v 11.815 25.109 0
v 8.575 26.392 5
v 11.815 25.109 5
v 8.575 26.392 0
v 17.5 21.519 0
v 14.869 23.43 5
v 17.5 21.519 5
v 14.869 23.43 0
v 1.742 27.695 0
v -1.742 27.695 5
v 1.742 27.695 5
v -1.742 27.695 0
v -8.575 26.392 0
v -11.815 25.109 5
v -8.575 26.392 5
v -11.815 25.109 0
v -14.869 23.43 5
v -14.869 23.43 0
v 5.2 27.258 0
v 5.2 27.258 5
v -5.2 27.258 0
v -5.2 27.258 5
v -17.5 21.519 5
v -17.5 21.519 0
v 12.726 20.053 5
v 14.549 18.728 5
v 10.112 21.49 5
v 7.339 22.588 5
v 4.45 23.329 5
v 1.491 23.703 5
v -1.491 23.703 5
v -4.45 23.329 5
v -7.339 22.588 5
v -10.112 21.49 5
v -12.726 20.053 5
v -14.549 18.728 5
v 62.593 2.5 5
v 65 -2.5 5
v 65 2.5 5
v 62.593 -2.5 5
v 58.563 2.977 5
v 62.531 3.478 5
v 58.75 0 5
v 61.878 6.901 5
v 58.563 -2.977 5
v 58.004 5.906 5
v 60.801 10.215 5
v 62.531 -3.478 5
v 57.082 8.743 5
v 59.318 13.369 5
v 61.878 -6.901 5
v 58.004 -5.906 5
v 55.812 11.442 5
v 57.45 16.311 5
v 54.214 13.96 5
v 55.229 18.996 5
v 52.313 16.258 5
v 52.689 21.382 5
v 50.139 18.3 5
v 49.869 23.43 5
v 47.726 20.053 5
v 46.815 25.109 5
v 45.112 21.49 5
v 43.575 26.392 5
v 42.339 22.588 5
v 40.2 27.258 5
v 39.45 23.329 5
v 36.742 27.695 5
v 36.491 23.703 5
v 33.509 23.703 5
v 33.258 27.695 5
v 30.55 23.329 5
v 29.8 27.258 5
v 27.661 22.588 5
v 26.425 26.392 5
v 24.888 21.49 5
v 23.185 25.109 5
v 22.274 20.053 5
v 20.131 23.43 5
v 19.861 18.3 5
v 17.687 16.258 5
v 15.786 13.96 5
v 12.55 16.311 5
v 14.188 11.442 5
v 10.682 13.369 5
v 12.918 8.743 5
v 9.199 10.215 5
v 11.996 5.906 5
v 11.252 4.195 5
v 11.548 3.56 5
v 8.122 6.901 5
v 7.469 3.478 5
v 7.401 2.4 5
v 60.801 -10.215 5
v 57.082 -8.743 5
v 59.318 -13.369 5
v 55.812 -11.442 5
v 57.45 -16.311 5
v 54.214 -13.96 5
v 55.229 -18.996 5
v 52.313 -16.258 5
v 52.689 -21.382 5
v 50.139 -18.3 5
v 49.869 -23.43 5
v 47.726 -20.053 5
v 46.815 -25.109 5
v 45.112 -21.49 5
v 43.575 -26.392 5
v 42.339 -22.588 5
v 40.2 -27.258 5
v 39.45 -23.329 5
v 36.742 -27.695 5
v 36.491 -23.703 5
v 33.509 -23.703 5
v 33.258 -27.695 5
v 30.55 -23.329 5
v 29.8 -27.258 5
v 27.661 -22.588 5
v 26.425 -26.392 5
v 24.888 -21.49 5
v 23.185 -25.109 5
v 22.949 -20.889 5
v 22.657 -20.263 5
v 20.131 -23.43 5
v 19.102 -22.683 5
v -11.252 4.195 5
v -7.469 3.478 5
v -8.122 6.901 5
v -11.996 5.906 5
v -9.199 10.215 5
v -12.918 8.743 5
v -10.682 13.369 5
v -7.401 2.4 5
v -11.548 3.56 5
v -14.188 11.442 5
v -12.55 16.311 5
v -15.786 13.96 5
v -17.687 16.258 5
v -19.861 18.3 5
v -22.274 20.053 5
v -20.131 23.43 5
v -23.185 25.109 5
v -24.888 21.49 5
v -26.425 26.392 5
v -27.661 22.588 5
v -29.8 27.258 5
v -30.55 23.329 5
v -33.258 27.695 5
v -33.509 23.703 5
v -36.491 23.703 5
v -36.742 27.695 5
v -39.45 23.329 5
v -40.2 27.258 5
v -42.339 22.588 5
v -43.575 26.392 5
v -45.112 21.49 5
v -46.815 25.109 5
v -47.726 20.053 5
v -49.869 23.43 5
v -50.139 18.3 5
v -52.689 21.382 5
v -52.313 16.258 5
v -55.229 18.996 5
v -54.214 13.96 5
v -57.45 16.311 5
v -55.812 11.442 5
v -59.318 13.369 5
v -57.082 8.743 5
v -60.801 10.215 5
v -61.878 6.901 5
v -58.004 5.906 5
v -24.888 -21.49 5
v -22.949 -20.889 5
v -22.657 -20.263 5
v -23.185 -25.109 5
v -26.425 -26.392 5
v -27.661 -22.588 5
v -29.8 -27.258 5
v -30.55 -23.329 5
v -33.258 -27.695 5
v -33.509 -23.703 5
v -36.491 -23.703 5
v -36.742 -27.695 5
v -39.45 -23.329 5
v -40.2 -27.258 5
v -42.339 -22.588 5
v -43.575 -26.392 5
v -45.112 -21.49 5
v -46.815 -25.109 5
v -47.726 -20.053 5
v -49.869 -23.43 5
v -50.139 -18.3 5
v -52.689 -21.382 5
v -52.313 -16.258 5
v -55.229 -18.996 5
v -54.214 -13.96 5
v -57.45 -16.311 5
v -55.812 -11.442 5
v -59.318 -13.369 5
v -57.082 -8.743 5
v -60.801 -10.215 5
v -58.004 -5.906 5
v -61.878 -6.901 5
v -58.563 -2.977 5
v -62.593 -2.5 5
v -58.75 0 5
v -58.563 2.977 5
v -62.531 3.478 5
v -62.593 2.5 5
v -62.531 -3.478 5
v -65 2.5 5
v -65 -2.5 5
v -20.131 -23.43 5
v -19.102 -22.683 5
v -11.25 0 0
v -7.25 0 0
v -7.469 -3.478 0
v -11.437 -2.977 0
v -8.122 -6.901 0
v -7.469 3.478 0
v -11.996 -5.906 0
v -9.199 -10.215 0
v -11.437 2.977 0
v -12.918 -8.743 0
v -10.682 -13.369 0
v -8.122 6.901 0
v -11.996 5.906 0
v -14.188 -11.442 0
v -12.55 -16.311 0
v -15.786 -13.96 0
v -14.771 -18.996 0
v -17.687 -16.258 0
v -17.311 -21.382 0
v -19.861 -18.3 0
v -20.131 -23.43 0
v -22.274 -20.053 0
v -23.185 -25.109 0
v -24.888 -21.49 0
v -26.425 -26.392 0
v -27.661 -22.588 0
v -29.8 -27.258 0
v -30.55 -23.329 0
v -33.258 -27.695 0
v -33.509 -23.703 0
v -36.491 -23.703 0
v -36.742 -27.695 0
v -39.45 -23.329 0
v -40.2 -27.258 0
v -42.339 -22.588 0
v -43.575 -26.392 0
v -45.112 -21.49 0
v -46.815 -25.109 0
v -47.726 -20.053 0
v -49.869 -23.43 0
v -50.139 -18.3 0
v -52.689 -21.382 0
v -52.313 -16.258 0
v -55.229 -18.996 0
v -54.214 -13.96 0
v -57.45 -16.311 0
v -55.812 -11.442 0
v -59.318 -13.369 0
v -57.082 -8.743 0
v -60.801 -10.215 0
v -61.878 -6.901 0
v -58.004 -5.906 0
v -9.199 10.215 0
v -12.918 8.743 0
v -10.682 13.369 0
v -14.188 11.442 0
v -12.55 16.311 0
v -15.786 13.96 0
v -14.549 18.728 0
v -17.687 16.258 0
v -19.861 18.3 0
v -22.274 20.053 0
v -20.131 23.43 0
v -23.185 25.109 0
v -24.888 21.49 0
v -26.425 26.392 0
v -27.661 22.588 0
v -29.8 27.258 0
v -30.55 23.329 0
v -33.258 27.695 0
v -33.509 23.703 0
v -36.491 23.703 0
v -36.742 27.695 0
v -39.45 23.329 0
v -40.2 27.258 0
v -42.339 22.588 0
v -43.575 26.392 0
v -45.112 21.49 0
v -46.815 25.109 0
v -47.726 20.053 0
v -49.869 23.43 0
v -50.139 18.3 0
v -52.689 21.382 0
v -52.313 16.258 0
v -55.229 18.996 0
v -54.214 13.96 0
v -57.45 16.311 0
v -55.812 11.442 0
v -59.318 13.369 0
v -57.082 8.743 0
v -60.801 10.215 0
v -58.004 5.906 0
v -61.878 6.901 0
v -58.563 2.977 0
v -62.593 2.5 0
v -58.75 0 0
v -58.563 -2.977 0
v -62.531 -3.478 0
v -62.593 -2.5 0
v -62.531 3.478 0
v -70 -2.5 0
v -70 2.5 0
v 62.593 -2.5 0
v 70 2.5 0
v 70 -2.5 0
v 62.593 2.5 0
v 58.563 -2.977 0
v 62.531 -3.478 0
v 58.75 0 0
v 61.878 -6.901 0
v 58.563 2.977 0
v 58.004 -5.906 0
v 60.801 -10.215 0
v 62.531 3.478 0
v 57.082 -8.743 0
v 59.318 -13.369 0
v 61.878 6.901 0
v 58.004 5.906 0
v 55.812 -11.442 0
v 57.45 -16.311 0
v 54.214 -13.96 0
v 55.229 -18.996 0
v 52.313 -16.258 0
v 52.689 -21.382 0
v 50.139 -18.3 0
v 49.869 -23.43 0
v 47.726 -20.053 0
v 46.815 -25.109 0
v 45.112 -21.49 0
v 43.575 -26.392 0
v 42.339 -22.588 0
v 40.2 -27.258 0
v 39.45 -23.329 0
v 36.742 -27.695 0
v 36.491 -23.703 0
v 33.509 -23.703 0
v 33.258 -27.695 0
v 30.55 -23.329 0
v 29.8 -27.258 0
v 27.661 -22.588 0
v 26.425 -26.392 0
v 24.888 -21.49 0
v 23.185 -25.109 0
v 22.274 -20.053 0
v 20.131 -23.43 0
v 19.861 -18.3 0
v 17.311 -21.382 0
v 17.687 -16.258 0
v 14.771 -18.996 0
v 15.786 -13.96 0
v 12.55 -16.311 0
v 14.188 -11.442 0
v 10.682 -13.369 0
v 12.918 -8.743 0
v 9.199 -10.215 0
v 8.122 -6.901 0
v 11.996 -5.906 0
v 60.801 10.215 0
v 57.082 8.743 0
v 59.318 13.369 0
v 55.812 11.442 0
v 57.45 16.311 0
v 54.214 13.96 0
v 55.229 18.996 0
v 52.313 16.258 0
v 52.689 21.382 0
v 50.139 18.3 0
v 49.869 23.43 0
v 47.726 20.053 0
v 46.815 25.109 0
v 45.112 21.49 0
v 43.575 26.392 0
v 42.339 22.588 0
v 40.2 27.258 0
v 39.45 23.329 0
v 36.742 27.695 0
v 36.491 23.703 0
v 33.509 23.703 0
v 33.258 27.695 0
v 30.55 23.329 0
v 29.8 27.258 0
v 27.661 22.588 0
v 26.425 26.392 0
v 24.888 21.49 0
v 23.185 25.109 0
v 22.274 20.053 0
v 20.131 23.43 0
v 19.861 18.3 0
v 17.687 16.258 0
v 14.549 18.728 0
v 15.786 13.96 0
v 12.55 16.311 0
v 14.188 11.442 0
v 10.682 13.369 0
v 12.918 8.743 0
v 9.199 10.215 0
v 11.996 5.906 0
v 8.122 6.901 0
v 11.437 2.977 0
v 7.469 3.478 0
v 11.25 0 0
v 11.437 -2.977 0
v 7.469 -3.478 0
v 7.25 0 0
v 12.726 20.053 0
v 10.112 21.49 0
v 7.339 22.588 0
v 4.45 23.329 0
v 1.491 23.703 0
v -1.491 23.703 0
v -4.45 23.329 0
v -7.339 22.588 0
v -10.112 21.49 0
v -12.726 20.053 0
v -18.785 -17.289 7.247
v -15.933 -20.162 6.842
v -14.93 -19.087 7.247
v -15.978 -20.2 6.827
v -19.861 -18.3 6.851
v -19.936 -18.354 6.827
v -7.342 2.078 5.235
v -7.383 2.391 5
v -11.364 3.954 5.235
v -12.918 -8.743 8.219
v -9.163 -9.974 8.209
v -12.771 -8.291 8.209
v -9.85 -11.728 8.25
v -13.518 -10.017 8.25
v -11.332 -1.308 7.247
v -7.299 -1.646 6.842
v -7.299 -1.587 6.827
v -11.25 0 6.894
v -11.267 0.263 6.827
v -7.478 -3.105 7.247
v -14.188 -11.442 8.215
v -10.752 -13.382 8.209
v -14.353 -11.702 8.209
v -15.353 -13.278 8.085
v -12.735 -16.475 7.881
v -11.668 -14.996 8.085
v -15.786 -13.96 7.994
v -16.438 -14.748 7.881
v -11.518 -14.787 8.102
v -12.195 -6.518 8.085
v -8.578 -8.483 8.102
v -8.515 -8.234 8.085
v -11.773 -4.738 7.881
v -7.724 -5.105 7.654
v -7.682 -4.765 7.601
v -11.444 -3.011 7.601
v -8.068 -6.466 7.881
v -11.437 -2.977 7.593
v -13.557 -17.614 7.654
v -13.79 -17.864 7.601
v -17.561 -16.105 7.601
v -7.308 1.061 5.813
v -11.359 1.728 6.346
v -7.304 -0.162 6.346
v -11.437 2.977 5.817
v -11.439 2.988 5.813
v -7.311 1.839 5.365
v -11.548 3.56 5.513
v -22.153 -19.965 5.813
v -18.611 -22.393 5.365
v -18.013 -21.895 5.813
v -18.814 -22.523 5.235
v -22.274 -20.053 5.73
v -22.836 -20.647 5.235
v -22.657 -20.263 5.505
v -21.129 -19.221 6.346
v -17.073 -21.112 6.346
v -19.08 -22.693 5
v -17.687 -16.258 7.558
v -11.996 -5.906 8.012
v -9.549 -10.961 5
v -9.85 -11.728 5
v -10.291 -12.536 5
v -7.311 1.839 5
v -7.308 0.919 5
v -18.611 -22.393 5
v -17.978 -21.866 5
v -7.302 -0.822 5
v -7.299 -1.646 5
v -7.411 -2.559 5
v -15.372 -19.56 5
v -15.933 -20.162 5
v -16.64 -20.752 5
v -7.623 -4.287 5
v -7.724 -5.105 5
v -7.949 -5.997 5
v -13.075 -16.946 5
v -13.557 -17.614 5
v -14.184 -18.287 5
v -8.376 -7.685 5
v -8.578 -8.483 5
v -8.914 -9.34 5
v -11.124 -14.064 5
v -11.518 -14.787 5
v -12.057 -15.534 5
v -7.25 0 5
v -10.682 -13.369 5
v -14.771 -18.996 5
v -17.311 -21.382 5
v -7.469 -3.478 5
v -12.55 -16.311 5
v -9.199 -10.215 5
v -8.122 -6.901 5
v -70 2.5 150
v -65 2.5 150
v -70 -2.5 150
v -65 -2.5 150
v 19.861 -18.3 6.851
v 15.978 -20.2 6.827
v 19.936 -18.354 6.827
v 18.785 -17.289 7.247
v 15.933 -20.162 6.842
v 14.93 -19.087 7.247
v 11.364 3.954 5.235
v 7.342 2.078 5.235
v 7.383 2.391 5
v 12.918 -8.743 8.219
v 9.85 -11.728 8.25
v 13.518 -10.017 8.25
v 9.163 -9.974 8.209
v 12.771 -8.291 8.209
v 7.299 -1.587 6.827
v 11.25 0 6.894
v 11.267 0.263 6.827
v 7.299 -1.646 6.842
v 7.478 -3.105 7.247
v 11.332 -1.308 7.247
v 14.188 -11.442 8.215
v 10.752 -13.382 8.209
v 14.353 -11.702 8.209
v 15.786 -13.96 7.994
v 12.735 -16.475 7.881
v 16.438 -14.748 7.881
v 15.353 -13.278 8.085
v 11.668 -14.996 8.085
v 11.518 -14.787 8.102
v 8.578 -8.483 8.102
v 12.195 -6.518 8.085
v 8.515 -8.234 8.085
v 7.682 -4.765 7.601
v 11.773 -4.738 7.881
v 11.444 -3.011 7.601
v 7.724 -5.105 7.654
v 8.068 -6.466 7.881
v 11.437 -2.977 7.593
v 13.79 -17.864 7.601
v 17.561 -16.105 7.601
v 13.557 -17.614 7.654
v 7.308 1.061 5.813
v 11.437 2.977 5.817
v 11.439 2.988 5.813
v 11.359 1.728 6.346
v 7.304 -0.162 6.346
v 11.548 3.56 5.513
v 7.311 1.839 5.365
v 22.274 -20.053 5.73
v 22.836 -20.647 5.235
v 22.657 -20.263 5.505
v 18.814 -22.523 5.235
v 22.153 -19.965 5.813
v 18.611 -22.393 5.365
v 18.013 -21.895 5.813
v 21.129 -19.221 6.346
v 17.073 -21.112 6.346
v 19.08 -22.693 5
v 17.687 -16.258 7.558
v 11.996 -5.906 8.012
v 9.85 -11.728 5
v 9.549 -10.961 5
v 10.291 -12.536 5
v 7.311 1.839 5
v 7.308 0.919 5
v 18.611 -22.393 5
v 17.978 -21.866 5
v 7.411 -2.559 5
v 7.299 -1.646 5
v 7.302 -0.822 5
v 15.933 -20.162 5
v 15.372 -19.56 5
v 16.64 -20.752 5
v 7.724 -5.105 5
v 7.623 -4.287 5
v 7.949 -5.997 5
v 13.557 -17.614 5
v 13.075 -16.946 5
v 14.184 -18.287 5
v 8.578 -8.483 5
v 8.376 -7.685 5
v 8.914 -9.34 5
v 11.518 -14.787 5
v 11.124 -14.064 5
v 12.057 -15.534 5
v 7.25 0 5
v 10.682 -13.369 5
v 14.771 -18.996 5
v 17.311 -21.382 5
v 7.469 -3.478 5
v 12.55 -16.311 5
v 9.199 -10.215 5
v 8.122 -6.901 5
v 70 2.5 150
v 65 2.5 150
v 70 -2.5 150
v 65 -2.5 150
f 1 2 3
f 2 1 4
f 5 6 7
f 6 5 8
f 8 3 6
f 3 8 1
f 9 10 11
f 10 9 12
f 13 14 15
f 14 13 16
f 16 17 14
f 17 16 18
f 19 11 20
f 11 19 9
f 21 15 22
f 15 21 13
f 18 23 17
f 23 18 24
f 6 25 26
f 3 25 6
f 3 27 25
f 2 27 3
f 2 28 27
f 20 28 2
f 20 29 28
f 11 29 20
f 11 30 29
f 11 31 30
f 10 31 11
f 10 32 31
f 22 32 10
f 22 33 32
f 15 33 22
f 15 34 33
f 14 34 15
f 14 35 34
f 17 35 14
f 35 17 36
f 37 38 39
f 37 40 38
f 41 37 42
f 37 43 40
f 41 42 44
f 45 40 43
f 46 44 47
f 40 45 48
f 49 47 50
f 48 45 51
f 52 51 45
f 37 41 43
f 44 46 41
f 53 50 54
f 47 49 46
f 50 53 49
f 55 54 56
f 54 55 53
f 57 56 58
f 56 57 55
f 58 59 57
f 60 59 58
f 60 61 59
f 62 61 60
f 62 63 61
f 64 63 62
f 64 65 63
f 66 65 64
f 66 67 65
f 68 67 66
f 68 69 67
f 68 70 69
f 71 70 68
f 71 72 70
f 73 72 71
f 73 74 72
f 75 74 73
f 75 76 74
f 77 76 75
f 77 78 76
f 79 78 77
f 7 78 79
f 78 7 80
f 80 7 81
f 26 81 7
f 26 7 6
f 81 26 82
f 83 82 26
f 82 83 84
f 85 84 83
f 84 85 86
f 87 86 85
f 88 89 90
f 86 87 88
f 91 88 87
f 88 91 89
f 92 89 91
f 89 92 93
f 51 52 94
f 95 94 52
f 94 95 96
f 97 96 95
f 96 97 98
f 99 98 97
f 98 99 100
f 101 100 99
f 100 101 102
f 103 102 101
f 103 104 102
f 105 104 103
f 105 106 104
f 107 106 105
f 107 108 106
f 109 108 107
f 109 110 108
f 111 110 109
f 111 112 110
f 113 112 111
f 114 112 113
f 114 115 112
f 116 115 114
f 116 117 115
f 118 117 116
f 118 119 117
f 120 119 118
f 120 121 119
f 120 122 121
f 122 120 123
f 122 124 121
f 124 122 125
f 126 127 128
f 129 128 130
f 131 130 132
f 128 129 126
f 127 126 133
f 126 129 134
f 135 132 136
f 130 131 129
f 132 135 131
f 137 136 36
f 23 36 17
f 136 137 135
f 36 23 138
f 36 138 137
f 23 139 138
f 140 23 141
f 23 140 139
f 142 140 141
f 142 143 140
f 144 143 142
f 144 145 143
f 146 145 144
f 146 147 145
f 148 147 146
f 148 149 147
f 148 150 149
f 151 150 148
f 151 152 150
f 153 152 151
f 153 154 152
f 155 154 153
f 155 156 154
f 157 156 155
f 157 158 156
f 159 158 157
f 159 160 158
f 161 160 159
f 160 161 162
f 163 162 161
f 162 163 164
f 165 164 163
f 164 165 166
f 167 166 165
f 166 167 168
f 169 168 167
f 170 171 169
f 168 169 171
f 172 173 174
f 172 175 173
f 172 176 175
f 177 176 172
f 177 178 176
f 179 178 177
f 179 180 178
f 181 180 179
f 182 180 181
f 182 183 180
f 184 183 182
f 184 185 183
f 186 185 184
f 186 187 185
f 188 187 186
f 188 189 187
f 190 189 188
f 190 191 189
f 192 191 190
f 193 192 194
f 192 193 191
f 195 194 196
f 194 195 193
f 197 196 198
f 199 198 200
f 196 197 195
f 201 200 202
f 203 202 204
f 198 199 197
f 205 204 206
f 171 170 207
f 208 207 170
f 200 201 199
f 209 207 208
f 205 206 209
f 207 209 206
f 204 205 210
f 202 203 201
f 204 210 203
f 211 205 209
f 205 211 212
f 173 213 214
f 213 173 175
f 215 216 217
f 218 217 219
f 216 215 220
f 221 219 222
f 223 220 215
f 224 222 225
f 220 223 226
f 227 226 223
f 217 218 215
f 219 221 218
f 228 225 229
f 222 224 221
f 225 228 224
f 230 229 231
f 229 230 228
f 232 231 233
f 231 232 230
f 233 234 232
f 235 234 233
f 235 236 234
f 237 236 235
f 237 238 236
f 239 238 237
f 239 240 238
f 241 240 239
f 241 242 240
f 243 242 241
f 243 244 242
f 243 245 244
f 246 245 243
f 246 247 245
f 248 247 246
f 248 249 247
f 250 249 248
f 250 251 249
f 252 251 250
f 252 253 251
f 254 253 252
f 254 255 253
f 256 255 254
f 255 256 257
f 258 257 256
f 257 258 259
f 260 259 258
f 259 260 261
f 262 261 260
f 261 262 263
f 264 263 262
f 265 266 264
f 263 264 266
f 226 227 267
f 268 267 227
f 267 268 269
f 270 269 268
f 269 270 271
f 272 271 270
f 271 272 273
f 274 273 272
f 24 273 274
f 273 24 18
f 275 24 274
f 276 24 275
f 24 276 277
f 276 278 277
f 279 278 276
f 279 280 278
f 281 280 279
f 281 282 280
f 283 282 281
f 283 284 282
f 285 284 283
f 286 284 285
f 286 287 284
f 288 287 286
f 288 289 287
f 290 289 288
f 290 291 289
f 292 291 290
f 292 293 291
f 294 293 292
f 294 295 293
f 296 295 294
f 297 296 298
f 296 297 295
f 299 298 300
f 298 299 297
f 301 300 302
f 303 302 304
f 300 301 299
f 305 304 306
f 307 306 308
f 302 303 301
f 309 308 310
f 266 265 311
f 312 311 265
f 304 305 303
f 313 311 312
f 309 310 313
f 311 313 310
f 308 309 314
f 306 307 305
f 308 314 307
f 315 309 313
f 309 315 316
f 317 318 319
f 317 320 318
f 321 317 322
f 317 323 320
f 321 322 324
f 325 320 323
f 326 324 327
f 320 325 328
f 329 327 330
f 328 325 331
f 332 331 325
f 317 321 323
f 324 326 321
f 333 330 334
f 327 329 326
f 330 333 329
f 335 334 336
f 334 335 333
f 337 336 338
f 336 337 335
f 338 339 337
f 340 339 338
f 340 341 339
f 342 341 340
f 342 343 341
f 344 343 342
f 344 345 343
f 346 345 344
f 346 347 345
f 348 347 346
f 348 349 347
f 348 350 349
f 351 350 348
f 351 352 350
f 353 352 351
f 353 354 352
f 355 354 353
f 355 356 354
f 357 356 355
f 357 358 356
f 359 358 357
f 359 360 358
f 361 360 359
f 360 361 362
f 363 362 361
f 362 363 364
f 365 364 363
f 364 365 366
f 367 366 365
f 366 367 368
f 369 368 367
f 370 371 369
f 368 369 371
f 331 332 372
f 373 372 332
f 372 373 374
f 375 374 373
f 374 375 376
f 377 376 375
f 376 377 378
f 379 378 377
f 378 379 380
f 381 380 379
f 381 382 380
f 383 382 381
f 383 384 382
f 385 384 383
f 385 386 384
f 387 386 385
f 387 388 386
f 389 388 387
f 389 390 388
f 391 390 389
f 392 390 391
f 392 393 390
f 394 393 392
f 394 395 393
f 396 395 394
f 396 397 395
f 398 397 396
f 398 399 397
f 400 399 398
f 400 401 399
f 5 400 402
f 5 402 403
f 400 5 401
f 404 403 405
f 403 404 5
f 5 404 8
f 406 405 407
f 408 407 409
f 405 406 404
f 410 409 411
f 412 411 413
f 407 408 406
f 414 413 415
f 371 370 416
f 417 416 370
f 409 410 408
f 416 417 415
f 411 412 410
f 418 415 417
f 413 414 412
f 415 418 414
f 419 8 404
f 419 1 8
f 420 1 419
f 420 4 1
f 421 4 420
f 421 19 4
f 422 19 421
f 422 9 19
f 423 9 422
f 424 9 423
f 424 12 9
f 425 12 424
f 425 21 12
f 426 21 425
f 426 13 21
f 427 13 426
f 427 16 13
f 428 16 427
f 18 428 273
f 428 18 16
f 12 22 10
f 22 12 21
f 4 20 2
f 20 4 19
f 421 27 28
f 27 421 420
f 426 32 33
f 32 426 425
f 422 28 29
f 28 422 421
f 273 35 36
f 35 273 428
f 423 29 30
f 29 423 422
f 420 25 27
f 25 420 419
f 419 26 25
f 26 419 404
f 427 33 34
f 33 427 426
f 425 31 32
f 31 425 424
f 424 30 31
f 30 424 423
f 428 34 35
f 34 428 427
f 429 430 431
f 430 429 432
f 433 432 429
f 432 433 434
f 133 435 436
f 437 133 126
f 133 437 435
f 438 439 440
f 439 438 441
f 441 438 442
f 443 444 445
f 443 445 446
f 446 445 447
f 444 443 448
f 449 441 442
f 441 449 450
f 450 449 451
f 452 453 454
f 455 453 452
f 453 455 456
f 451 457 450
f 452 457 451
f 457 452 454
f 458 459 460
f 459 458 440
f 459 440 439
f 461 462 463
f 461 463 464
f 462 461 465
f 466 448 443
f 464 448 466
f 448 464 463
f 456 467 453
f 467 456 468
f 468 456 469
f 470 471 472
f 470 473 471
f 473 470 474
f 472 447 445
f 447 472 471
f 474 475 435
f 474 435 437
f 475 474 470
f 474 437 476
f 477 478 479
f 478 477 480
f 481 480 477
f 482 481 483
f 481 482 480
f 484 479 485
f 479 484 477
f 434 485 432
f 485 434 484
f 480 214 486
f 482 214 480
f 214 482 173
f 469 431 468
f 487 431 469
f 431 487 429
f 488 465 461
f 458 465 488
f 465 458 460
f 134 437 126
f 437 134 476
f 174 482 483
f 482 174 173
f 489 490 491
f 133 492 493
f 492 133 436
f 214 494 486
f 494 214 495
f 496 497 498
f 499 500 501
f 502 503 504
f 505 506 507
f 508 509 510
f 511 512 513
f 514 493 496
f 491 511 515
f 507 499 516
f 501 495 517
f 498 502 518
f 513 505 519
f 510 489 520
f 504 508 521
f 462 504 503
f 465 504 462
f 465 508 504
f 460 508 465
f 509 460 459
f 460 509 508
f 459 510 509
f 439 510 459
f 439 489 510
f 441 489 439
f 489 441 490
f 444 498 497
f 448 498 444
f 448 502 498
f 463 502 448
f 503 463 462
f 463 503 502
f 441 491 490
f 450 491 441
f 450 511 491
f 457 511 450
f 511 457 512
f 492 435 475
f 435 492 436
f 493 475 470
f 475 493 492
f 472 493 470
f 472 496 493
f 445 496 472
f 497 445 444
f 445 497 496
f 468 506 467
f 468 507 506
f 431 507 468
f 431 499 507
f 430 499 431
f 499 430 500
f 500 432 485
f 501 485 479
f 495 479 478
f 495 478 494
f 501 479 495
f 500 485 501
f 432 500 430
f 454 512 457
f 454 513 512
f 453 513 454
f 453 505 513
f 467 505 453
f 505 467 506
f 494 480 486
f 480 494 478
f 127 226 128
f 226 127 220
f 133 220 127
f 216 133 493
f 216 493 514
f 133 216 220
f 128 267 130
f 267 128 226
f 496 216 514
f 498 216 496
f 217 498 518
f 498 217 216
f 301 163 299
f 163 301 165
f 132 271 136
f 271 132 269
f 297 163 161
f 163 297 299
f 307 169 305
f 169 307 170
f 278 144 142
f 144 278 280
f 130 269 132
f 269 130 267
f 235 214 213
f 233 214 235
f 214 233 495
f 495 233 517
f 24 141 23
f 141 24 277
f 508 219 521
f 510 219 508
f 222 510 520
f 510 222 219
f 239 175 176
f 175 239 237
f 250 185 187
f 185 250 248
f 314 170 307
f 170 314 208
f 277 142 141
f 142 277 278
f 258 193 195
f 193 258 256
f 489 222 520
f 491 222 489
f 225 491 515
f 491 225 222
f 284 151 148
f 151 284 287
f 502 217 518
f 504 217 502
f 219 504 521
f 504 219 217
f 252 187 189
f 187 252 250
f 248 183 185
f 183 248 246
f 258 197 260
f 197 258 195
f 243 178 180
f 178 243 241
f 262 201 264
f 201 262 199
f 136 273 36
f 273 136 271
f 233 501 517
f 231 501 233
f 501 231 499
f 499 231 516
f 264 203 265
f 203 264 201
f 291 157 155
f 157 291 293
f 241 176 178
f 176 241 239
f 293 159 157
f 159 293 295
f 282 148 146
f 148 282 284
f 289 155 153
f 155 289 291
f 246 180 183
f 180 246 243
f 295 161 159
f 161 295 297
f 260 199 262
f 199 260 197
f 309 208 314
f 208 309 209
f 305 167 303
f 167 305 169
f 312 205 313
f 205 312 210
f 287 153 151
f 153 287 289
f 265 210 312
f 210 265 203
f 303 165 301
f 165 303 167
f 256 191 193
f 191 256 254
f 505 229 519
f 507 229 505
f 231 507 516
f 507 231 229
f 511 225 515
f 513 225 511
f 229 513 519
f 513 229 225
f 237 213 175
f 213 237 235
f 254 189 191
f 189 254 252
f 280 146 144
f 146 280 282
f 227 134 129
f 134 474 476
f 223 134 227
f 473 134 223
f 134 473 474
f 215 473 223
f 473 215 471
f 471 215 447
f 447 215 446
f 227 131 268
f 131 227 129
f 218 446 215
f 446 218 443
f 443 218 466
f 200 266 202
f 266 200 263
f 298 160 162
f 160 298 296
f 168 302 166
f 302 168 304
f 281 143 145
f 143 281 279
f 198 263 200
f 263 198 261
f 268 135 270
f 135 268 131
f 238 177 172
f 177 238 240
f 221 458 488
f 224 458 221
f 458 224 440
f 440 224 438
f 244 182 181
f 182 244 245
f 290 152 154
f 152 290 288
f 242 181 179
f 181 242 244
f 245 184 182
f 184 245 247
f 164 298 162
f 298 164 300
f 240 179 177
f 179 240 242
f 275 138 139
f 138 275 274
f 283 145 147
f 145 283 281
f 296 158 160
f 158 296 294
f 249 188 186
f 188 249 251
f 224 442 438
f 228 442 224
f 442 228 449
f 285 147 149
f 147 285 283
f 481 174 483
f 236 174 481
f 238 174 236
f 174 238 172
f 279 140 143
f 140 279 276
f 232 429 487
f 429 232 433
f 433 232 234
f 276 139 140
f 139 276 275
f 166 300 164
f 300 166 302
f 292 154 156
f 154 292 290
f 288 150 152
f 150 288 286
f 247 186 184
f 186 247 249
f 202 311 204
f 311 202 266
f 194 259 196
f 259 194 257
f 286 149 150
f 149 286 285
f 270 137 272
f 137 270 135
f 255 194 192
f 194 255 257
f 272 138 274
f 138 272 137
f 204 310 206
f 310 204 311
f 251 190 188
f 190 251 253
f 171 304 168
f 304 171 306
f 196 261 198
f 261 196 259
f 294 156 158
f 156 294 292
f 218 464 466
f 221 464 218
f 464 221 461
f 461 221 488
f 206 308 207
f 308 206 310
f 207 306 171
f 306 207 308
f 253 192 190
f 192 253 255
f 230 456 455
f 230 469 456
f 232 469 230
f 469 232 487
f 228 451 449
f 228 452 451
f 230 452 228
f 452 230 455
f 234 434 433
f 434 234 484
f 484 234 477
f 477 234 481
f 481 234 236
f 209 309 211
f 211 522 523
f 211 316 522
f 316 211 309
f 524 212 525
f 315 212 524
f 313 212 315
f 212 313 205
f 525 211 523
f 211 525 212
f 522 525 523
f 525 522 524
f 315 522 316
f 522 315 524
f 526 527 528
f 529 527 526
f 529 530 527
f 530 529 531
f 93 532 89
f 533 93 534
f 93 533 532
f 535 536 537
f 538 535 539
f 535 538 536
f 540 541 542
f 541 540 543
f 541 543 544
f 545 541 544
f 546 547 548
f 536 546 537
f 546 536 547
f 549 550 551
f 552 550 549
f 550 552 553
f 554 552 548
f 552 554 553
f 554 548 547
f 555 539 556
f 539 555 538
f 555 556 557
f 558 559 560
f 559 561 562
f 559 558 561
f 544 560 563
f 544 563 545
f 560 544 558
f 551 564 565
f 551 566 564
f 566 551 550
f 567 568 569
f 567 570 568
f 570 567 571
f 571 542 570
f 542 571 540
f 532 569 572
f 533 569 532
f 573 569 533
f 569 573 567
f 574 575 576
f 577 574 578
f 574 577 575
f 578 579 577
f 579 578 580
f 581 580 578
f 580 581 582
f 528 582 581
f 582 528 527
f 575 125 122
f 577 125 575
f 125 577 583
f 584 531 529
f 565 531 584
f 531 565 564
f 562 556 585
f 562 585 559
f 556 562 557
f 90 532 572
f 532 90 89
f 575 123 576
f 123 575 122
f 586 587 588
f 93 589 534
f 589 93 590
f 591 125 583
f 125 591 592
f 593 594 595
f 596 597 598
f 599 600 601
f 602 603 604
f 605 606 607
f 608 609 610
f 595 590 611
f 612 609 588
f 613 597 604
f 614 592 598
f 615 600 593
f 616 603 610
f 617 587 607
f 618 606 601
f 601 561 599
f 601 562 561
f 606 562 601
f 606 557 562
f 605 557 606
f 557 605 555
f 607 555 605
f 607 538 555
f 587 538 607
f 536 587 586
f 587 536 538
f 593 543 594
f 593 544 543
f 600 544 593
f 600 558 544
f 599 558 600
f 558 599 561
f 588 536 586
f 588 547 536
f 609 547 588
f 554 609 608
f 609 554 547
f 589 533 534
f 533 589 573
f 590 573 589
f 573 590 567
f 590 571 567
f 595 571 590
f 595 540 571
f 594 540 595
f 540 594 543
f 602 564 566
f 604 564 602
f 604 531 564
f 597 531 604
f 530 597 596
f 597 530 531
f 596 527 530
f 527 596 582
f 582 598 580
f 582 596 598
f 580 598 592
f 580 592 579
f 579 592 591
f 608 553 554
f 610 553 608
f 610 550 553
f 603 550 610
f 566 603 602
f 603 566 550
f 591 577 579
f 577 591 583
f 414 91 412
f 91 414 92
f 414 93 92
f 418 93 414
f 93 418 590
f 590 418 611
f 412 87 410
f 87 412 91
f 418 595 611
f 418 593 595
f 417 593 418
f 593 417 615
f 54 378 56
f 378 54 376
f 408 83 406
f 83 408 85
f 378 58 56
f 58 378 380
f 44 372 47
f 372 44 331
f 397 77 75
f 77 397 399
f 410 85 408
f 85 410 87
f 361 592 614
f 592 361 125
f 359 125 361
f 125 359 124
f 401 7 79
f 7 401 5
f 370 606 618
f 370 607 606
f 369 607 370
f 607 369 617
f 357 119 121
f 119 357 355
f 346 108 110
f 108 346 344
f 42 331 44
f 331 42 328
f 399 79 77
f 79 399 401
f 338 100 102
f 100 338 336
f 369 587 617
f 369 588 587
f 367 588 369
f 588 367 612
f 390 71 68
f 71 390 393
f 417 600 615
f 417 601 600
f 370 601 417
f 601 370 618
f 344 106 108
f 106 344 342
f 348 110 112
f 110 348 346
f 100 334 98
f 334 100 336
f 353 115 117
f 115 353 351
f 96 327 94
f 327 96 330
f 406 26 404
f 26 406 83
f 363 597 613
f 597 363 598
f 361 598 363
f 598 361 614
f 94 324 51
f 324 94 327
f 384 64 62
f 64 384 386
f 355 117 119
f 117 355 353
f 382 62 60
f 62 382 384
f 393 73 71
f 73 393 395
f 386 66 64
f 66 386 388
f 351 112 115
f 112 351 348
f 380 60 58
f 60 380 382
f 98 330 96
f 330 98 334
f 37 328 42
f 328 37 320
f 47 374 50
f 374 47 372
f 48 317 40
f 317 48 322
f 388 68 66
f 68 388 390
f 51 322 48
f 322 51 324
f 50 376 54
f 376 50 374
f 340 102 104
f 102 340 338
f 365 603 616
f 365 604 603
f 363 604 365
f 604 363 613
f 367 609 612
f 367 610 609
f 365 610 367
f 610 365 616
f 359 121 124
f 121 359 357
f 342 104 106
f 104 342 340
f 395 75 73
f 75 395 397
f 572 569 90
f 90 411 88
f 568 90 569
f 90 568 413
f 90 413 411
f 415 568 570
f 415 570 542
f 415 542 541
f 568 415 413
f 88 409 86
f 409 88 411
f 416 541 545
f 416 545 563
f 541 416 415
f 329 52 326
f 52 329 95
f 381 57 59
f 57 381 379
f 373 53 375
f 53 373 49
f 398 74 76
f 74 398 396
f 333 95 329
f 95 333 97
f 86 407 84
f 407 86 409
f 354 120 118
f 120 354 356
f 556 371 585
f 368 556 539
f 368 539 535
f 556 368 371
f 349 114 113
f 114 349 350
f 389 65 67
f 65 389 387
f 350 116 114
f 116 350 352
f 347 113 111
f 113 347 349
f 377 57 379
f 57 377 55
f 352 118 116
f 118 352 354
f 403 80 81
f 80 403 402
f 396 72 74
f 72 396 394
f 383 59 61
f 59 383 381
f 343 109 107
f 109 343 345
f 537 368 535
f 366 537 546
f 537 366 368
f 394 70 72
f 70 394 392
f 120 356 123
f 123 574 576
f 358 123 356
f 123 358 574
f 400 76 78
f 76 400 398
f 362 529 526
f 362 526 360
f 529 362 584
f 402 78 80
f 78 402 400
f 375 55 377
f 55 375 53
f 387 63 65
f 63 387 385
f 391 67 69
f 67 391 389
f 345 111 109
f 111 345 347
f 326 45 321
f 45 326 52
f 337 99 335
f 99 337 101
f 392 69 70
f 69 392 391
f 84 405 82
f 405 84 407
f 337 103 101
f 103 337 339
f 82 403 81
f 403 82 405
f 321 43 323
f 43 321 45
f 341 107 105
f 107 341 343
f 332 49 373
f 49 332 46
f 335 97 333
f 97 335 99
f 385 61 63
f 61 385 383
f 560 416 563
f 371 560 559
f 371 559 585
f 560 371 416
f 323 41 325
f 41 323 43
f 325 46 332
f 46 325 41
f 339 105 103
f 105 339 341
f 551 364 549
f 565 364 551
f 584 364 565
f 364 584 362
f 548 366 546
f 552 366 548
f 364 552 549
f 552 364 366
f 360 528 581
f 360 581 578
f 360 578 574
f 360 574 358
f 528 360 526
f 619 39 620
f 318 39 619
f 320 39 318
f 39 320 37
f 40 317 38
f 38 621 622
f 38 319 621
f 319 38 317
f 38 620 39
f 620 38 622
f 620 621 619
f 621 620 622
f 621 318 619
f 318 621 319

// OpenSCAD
//Lens diameter
gdiam=47.5;
//Temple size (width of glasses).
tsize=135;
//Pupil distance
pd=70;
//Glasses thickness
th=4;
//Temple length
lscales=150;
//Thickness of the lenses
gheight=5;

$fn=50;

module EyeCylinder()
{
        difference()
        {
            union()
            {
                cylinder(d=gdiam+th*2, h=gheight);
                NosePad();
            }
            LensHole();
        }  
}

module  LensHole()
{
    translate([0,0,-.1])
    cylinder(d=gdiam, h=gheight*2.2, center=true);
}

module NosePad()
{
    rotate([0,0,-25])
    intersection()
    {
        translate([gdiam/2,0,th/2])
     
        scale([1,1,.35])
        rotate([0,90,0])
        cylinder(r=15, h=th*2, center=true);

        scale(100) // The lower half only
        translate([-.5,-.5,-1])
        cube(1);
        
        cylinder(d=gdiam+th*2, h=gheight*15, center=true); // Inside the lens cylinder
    }
}

module Eye()
{
    EyeCylinder();
    translate([0,0,gheight])
    mirror([0,0,1])
    {
        offs=(tsize-pd)/2;
        
        translate([-offs,0,0])
        scale([offs-(gdiam+2*th)/2, gheight, gheight])
        translate([.65,0,.5])
        cube(1, center=true);
        
        
        translate([-offs,0,])
        scale([gheight,gheight,lscales])
        translate([0,0,.5])
        cube(1,center=true);
    }
}

module TwoEyes()
{
    translate([-pd/2,0,gheight]) // Center
    mirror([0,0,1])
    union()
    {
        Eye();
        translate([pd,0,0])
        mirror([1,0,0]) // Not necessary for a round lens
        Eye();
    }
}

module RoundGlasses()
{
    difference()
    {
        cylinder(d=gdiam+th*2, h=gheight);
        LensHole();
        translate([-pd/2,0,0])
        LensHole();
        translate([pd/2,0,0])
        LensHole();
        translate([-pd/2,-pd,-pd/2])
        cube(pd);
    }
    TwoEyes();
}

RoundGlasses();


        
